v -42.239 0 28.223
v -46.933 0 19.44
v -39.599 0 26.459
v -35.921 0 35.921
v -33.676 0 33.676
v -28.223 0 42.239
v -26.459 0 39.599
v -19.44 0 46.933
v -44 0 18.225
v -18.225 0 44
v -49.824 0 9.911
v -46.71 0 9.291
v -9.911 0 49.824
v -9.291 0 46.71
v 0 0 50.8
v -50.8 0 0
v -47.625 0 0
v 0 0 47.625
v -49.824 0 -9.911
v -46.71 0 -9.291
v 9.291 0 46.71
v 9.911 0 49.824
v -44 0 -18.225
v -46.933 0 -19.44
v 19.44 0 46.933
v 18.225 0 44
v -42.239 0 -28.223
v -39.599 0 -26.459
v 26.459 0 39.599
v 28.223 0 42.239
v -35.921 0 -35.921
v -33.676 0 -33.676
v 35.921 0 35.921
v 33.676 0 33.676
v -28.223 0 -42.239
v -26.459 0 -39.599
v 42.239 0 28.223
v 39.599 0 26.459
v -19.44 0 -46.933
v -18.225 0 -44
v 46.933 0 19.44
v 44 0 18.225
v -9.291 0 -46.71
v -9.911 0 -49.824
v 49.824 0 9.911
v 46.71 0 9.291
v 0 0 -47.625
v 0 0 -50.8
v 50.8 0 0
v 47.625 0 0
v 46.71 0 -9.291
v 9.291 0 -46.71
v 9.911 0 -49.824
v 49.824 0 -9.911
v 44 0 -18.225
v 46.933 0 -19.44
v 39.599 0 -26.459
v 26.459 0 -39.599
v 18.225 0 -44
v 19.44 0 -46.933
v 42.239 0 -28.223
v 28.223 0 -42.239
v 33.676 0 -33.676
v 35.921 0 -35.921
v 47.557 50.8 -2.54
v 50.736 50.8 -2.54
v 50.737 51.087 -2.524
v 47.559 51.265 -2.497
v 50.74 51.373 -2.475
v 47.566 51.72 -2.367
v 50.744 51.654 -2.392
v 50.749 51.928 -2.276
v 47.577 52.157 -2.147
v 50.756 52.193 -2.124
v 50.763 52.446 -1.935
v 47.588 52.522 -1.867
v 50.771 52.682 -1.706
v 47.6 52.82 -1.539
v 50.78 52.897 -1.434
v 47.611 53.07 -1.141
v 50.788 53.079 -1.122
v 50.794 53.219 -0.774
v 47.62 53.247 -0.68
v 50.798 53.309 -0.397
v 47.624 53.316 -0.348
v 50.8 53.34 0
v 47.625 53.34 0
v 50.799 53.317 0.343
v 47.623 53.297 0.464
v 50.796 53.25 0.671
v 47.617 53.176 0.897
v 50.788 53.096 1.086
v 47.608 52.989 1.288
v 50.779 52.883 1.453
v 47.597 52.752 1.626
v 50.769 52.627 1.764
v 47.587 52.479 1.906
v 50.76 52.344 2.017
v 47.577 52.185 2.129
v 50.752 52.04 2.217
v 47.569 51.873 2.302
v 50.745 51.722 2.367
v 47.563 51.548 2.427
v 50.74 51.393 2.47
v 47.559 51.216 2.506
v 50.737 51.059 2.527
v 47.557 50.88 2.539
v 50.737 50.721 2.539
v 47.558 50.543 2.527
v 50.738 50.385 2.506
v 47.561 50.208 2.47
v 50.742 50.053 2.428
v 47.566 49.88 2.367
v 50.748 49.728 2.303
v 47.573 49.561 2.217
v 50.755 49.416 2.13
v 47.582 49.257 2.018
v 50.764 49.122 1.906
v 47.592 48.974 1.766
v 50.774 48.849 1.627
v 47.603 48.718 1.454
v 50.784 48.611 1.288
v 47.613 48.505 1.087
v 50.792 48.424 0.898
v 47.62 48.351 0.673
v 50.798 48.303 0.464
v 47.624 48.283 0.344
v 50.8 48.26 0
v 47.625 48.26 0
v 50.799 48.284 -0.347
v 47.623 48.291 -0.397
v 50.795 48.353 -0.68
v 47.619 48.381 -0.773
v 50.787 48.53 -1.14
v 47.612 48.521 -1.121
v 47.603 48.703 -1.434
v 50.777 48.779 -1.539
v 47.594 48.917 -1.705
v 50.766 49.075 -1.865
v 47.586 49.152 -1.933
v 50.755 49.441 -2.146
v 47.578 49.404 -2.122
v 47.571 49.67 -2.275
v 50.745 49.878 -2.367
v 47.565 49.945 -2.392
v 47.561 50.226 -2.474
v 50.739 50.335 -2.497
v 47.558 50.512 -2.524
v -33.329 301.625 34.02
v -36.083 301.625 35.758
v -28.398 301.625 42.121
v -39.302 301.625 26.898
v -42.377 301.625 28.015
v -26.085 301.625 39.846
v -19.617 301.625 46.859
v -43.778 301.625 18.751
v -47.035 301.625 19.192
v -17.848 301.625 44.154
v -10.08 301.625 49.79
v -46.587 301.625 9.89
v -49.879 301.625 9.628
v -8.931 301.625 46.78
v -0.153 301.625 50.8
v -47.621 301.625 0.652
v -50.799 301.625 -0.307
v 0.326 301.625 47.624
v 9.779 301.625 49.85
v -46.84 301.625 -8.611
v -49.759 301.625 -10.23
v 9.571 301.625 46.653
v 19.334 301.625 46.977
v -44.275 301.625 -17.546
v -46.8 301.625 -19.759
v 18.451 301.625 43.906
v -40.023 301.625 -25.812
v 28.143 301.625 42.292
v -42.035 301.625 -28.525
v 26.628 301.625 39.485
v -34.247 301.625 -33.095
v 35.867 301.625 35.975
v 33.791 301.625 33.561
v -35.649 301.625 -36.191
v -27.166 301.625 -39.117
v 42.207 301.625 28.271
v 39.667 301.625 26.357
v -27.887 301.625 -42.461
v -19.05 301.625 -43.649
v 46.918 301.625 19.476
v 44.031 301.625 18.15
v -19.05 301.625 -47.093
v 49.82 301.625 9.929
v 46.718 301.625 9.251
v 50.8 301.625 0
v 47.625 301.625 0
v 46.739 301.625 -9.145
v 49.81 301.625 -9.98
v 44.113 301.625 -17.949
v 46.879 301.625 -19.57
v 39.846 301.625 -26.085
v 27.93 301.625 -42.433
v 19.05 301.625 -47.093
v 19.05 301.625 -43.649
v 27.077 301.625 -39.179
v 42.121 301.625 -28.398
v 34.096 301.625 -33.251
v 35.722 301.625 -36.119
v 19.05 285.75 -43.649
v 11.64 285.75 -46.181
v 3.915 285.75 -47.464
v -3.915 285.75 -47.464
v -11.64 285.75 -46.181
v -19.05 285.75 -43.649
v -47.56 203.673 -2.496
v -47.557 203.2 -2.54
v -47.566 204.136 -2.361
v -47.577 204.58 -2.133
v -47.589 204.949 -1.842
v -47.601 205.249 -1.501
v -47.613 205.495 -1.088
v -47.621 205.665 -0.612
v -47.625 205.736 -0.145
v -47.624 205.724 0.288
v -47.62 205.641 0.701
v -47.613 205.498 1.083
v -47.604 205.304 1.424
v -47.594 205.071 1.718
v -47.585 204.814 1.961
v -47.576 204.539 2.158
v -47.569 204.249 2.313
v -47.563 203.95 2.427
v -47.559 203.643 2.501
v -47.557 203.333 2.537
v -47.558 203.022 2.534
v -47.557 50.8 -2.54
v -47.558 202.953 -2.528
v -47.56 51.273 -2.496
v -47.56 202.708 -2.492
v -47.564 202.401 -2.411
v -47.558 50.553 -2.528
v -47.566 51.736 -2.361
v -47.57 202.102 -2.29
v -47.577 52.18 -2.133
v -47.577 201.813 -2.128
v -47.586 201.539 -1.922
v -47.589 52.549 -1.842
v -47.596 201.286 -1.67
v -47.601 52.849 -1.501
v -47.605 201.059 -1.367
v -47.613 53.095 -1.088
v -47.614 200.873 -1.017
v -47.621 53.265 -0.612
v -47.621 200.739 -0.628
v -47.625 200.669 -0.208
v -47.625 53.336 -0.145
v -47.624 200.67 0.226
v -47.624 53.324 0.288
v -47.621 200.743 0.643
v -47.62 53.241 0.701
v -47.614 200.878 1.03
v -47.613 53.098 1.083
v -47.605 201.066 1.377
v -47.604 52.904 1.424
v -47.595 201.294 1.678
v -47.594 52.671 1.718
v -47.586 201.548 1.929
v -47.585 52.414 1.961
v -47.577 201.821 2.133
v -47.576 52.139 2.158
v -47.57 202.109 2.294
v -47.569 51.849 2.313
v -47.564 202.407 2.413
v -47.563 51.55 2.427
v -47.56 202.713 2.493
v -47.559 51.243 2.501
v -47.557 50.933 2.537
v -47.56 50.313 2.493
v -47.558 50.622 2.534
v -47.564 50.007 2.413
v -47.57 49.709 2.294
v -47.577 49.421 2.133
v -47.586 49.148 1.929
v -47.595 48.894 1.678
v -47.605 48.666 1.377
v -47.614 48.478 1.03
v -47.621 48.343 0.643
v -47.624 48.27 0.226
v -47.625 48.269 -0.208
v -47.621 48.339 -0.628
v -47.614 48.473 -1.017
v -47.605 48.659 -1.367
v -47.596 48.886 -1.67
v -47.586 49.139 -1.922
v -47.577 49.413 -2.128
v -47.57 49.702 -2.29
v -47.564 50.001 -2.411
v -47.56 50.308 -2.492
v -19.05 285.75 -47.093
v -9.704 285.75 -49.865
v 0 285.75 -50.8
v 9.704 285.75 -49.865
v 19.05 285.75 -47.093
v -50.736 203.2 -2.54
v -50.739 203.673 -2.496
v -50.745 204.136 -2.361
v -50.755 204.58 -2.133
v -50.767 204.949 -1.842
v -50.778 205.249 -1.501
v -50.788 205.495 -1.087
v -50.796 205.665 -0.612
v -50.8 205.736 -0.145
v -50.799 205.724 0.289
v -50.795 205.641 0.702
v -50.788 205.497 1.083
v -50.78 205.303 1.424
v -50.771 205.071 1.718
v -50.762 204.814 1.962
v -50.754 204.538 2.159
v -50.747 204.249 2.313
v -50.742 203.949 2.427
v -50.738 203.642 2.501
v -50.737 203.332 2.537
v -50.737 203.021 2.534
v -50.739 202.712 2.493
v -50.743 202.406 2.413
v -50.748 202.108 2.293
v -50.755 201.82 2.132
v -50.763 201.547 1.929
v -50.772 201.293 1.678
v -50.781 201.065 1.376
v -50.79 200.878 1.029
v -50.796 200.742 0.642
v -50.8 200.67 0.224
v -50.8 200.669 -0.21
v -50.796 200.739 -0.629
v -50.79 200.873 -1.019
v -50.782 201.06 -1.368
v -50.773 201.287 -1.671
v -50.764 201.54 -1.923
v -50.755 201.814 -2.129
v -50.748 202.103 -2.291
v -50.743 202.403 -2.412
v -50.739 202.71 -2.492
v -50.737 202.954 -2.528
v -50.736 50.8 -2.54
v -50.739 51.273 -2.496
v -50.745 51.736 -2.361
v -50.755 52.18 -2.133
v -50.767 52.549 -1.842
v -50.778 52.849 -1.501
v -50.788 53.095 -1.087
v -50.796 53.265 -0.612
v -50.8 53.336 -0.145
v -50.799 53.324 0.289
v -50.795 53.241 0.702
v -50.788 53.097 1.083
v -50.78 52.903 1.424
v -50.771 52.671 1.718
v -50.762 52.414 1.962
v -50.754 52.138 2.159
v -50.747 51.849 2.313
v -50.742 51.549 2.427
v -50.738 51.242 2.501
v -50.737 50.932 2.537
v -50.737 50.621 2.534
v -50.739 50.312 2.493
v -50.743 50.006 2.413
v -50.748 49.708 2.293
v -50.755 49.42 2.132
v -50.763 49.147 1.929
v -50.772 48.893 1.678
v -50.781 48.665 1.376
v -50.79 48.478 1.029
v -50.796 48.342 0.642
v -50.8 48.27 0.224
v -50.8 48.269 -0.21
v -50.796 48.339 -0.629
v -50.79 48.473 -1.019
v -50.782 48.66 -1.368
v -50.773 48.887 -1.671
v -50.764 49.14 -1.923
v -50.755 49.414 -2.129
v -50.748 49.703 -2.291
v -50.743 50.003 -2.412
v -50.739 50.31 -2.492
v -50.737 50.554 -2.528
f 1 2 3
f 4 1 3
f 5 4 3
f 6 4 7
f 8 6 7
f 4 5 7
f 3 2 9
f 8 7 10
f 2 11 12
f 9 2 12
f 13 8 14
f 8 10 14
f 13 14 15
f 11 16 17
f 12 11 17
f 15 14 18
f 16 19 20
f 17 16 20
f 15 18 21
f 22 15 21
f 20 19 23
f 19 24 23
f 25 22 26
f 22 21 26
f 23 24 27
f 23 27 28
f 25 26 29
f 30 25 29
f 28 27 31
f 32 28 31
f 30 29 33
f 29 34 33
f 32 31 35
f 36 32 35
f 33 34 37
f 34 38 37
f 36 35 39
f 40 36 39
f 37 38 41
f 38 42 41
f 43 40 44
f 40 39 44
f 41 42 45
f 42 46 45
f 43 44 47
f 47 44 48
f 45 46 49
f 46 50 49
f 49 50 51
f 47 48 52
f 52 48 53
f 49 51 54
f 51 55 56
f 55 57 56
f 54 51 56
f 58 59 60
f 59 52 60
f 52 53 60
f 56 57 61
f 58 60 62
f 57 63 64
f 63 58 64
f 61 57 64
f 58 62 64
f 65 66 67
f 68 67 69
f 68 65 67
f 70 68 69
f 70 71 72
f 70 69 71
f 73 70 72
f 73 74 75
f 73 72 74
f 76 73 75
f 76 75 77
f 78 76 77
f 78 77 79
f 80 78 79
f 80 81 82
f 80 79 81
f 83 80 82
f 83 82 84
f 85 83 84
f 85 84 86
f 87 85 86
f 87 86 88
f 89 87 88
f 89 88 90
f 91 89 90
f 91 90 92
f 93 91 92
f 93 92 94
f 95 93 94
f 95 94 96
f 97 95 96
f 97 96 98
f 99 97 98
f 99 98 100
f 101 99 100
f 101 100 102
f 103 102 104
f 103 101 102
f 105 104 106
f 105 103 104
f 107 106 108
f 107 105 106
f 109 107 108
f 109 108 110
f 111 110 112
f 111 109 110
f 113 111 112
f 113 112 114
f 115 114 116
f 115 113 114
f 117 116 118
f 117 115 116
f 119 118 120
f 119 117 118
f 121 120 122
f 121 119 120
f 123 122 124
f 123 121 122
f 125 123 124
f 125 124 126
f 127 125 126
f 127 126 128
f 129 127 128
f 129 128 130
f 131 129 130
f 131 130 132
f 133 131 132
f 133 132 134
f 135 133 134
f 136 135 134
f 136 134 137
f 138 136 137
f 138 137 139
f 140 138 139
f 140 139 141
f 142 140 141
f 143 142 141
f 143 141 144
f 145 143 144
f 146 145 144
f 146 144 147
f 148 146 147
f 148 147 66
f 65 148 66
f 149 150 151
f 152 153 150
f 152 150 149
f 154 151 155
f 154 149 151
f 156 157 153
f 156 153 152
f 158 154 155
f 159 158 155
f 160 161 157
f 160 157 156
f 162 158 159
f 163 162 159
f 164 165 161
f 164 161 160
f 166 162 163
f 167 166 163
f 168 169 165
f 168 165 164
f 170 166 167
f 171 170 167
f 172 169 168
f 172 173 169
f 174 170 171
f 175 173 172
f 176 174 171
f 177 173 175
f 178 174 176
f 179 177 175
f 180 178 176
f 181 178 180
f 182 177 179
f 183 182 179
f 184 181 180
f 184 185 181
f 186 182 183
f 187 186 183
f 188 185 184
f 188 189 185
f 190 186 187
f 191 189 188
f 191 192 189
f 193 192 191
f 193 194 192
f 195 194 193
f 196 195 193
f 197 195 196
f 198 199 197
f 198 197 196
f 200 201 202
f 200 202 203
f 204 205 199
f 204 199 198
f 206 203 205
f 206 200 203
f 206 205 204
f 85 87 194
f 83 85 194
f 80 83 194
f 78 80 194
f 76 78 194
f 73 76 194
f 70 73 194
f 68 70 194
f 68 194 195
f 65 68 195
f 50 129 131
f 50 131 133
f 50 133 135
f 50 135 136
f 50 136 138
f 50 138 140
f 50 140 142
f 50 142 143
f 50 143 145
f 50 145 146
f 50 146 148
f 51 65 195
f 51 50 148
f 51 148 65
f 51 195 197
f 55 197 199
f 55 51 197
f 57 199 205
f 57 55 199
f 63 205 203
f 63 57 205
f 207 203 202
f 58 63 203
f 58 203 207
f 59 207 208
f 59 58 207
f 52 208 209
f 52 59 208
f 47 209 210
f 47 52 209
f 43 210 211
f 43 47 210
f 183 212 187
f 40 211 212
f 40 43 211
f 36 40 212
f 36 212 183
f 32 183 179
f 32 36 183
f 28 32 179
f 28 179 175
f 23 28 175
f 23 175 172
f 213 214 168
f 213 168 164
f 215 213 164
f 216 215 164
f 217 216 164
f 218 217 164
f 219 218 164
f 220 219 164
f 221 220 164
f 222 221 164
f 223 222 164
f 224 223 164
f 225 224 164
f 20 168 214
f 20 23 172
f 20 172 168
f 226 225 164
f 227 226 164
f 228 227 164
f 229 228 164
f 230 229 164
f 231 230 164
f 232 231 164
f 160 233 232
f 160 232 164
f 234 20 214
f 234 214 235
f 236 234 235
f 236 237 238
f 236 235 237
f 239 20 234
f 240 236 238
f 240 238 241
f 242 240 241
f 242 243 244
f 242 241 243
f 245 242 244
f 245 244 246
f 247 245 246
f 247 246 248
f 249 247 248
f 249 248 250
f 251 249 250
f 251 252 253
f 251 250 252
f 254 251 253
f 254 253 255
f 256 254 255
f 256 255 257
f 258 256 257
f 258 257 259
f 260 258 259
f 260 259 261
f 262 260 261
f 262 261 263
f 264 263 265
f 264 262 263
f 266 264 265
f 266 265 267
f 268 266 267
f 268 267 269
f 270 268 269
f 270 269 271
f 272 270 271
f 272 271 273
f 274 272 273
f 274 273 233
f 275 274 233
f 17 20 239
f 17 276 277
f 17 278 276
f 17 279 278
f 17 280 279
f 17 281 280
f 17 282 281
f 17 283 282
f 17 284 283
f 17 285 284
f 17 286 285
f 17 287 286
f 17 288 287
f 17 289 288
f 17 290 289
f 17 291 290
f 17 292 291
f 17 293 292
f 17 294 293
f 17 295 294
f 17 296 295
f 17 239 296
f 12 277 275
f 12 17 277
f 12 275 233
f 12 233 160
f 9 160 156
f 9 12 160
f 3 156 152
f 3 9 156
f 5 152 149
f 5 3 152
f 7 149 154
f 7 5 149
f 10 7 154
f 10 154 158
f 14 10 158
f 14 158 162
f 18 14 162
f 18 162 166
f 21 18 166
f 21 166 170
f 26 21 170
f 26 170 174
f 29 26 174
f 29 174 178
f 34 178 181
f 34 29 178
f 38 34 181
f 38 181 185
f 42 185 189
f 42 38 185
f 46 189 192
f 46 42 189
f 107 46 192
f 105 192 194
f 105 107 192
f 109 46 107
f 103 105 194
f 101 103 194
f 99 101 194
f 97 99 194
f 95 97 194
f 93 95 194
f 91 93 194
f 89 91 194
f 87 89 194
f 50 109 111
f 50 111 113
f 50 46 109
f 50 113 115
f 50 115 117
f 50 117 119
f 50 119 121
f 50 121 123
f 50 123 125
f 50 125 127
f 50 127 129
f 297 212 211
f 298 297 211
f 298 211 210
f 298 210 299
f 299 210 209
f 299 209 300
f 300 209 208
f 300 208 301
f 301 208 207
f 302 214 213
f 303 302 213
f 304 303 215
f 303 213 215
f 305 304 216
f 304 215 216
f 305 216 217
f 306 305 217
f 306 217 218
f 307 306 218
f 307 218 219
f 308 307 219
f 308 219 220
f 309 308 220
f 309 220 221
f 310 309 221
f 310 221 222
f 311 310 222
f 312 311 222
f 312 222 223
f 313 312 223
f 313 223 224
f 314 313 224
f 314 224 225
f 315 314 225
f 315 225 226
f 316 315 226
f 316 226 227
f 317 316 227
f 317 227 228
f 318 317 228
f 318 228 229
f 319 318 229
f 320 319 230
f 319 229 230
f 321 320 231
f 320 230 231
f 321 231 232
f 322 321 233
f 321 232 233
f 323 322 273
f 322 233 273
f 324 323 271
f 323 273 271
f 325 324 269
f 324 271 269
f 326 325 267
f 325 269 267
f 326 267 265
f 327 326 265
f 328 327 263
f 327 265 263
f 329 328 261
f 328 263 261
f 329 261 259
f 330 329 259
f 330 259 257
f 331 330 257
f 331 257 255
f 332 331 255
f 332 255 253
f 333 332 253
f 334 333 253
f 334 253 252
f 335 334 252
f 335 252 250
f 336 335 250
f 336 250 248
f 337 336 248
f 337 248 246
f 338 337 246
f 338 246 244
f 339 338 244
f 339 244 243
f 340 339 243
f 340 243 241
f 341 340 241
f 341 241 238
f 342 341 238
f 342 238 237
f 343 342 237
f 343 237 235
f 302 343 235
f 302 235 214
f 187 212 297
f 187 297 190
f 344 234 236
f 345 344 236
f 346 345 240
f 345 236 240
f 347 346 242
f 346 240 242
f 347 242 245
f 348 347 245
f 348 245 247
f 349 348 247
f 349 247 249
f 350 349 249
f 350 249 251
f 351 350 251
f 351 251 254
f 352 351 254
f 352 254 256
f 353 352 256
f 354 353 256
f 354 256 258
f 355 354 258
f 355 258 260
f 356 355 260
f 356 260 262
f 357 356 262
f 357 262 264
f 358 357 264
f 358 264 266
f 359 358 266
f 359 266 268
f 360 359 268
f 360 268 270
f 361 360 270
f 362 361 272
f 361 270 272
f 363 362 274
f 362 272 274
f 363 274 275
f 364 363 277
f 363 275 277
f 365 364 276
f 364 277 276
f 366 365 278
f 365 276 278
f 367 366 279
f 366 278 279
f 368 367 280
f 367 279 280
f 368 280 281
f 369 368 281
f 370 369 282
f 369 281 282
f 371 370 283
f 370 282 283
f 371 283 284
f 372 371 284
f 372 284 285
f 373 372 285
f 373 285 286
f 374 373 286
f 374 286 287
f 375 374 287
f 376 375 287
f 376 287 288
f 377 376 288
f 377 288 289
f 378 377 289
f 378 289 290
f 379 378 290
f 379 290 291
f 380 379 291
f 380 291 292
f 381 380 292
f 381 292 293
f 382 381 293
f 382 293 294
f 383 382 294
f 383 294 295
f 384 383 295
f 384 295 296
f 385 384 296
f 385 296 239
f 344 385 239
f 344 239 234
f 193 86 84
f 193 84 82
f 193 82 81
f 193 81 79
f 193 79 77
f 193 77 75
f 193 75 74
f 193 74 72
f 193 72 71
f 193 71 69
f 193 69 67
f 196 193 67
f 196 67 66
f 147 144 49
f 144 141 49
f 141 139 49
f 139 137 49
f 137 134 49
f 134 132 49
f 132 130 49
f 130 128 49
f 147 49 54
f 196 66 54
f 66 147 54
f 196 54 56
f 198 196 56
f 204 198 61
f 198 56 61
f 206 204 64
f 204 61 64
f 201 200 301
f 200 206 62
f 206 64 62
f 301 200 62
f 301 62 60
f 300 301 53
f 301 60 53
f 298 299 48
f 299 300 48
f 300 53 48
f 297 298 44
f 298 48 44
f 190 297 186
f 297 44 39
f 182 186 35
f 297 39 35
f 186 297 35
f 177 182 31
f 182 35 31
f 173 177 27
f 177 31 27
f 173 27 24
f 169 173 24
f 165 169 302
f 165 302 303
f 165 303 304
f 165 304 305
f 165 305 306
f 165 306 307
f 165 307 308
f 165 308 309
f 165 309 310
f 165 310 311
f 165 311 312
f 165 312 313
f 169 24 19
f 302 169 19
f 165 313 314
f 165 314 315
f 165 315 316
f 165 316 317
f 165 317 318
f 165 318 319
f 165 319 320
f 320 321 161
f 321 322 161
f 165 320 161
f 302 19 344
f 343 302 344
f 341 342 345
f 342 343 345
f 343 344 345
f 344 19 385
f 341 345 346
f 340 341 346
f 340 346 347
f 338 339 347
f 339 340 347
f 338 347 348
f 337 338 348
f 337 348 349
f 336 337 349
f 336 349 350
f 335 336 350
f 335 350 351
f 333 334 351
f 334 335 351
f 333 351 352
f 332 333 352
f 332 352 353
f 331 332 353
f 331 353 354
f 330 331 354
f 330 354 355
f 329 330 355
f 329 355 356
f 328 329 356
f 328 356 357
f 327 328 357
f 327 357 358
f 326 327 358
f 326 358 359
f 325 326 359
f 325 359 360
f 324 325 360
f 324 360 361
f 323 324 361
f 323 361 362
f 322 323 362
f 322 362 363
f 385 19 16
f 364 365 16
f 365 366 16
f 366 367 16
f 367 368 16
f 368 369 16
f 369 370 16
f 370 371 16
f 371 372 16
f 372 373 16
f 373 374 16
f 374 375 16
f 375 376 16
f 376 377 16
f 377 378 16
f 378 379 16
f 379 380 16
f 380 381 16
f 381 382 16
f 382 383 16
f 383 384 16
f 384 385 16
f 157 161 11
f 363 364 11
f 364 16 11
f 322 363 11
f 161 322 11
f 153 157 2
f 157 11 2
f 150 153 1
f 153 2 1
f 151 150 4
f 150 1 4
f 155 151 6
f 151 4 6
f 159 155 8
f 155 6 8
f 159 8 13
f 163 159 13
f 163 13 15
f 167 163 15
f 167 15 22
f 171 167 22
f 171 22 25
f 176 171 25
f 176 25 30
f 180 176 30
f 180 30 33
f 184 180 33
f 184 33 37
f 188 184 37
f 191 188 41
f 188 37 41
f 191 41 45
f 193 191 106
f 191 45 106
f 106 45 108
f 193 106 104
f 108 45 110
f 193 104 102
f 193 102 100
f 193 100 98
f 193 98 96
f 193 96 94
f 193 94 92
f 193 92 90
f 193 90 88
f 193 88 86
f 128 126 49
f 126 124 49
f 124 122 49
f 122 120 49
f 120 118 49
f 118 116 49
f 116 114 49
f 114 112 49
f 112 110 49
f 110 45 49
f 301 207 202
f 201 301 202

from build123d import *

# Parameters (mm, degrees)
SKETCH1_R                      = 50.8
SKETCH1_R_2                    = 47.625
EXTRUDE_THIN1_DEPTH            = 301.625
CUT_EXTRUDE1_REACH             = 52.8
SKETCH2_W                      = 38.1
SKETCH2_H                      = 31.75
CUT_EXTRUDE2_REACH             = 52.8
SKETCH3_R                      = 2.54
CUT_EXTRUDE2_DIRECTION_2_REACH = 52.8
CUT_EXTRUDE3_REACH             = 52.8
SKETCH4_R                      = 2.54


with BuildPart() as part:
    # Sketch1 → Extrude-Thin1 (new body)
    with BuildSketch(Plane(origin=(0, 0, 0), x_dir=(1, 0, 0), z_dir=(0, 1, 0))):
        Circle(SKETCH1_R)
        Circle(SKETCH1_R_2, mode=Mode.SUBTRACT)
    extrude(amount=EXTRUDE_THIN1_DEPTH)

    # Sketch2 → Cut-Extrude1 (cut, up to next)
    with BuildSketch(Plane.XY, mode=Mode.PRIVATE) as cut_extrude1_sk1:
        with Locations((0, 301.625)):
            Rectangle(SKETCH2_W, SKETCH2_H)
    cut_extrude1_tool1 = extrude(cut_extrude1_sk1.sketch, amount=-CUT_EXTRUDE1_REACH, mode=Mode.PRIVATE) & part.part
    add(cut_extrude1_tool1.solids().sort_by_distance((0, 301.625, 0))[0], mode=Mode.SUBTRACT)

    # Sketch3 → Cut-Extrude2 (cut, up to next)
    with BuildSketch(Plane(origin=(0, 0, 0), x_dir=(0, 0, -1), z_dir=(1, 0, 0)), mode=Mode.PRIVATE) as cut_extrude2_sk1:
        with Locations((0, 50.8)):
            Circle(SKETCH3_R)
    cut_extrude2_tool1 = extrude(cut_extrude2_sk1.sketch, amount=-CUT_EXTRUDE2_REACH, mode=Mode.PRIVATE) & part.part
    add(cut_extrude2_tool1.solids().sort_by_distance((0, 50.8, 0))[0], mode=Mode.SUBTRACT)

    # Sketch3 → Cut-Extrude2 direction 2 (cut, up to next)
    with BuildSketch(Plane(origin=(0, 0, 0), x_dir=(0, 0, -1), z_dir=(1, 0, 0)), mode=Mode.PRIVATE) as cut_extrude2_direction_2_sk1:
        with Locations((0, 50.8)):
            Circle(SKETCH3_R)
    cut_extrude2_direction_2_tool1 = extrude(cut_extrude2_direction_2_sk1.sketch, amount=CUT_EXTRUDE2_DIRECTION_2_REACH, mode=Mode.PRIVATE) & part.part
    add(cut_extrude2_direction_2_tool1.solids().sort_by_distance((0, 50.8, 0))[0], mode=Mode.SUBTRACT)

    # Sketch4 → Cut-Extrude3 (cut, up to next)
    with BuildSketch(Plane(origin=(0, 0, 0), x_dir=(0, 0, -1), z_dir=(1, 0, 0)), mode=Mode.PRIVATE) as cut_extrude3_sk1:
        with Locations((0, 203.2)):
            Circle(SKETCH4_R)
    cut_extrude3_tool1 = extrude(cut_extrude3_sk1.sketch, amount=-CUT_EXTRUDE3_REACH, mode=Mode.PRIVATE) & part.part
    add(cut_extrude3_tool1.solids().sort_by_distance((0, 203.2, 0))[0], mode=Mode.SUBTRACT)


solid = part.part
